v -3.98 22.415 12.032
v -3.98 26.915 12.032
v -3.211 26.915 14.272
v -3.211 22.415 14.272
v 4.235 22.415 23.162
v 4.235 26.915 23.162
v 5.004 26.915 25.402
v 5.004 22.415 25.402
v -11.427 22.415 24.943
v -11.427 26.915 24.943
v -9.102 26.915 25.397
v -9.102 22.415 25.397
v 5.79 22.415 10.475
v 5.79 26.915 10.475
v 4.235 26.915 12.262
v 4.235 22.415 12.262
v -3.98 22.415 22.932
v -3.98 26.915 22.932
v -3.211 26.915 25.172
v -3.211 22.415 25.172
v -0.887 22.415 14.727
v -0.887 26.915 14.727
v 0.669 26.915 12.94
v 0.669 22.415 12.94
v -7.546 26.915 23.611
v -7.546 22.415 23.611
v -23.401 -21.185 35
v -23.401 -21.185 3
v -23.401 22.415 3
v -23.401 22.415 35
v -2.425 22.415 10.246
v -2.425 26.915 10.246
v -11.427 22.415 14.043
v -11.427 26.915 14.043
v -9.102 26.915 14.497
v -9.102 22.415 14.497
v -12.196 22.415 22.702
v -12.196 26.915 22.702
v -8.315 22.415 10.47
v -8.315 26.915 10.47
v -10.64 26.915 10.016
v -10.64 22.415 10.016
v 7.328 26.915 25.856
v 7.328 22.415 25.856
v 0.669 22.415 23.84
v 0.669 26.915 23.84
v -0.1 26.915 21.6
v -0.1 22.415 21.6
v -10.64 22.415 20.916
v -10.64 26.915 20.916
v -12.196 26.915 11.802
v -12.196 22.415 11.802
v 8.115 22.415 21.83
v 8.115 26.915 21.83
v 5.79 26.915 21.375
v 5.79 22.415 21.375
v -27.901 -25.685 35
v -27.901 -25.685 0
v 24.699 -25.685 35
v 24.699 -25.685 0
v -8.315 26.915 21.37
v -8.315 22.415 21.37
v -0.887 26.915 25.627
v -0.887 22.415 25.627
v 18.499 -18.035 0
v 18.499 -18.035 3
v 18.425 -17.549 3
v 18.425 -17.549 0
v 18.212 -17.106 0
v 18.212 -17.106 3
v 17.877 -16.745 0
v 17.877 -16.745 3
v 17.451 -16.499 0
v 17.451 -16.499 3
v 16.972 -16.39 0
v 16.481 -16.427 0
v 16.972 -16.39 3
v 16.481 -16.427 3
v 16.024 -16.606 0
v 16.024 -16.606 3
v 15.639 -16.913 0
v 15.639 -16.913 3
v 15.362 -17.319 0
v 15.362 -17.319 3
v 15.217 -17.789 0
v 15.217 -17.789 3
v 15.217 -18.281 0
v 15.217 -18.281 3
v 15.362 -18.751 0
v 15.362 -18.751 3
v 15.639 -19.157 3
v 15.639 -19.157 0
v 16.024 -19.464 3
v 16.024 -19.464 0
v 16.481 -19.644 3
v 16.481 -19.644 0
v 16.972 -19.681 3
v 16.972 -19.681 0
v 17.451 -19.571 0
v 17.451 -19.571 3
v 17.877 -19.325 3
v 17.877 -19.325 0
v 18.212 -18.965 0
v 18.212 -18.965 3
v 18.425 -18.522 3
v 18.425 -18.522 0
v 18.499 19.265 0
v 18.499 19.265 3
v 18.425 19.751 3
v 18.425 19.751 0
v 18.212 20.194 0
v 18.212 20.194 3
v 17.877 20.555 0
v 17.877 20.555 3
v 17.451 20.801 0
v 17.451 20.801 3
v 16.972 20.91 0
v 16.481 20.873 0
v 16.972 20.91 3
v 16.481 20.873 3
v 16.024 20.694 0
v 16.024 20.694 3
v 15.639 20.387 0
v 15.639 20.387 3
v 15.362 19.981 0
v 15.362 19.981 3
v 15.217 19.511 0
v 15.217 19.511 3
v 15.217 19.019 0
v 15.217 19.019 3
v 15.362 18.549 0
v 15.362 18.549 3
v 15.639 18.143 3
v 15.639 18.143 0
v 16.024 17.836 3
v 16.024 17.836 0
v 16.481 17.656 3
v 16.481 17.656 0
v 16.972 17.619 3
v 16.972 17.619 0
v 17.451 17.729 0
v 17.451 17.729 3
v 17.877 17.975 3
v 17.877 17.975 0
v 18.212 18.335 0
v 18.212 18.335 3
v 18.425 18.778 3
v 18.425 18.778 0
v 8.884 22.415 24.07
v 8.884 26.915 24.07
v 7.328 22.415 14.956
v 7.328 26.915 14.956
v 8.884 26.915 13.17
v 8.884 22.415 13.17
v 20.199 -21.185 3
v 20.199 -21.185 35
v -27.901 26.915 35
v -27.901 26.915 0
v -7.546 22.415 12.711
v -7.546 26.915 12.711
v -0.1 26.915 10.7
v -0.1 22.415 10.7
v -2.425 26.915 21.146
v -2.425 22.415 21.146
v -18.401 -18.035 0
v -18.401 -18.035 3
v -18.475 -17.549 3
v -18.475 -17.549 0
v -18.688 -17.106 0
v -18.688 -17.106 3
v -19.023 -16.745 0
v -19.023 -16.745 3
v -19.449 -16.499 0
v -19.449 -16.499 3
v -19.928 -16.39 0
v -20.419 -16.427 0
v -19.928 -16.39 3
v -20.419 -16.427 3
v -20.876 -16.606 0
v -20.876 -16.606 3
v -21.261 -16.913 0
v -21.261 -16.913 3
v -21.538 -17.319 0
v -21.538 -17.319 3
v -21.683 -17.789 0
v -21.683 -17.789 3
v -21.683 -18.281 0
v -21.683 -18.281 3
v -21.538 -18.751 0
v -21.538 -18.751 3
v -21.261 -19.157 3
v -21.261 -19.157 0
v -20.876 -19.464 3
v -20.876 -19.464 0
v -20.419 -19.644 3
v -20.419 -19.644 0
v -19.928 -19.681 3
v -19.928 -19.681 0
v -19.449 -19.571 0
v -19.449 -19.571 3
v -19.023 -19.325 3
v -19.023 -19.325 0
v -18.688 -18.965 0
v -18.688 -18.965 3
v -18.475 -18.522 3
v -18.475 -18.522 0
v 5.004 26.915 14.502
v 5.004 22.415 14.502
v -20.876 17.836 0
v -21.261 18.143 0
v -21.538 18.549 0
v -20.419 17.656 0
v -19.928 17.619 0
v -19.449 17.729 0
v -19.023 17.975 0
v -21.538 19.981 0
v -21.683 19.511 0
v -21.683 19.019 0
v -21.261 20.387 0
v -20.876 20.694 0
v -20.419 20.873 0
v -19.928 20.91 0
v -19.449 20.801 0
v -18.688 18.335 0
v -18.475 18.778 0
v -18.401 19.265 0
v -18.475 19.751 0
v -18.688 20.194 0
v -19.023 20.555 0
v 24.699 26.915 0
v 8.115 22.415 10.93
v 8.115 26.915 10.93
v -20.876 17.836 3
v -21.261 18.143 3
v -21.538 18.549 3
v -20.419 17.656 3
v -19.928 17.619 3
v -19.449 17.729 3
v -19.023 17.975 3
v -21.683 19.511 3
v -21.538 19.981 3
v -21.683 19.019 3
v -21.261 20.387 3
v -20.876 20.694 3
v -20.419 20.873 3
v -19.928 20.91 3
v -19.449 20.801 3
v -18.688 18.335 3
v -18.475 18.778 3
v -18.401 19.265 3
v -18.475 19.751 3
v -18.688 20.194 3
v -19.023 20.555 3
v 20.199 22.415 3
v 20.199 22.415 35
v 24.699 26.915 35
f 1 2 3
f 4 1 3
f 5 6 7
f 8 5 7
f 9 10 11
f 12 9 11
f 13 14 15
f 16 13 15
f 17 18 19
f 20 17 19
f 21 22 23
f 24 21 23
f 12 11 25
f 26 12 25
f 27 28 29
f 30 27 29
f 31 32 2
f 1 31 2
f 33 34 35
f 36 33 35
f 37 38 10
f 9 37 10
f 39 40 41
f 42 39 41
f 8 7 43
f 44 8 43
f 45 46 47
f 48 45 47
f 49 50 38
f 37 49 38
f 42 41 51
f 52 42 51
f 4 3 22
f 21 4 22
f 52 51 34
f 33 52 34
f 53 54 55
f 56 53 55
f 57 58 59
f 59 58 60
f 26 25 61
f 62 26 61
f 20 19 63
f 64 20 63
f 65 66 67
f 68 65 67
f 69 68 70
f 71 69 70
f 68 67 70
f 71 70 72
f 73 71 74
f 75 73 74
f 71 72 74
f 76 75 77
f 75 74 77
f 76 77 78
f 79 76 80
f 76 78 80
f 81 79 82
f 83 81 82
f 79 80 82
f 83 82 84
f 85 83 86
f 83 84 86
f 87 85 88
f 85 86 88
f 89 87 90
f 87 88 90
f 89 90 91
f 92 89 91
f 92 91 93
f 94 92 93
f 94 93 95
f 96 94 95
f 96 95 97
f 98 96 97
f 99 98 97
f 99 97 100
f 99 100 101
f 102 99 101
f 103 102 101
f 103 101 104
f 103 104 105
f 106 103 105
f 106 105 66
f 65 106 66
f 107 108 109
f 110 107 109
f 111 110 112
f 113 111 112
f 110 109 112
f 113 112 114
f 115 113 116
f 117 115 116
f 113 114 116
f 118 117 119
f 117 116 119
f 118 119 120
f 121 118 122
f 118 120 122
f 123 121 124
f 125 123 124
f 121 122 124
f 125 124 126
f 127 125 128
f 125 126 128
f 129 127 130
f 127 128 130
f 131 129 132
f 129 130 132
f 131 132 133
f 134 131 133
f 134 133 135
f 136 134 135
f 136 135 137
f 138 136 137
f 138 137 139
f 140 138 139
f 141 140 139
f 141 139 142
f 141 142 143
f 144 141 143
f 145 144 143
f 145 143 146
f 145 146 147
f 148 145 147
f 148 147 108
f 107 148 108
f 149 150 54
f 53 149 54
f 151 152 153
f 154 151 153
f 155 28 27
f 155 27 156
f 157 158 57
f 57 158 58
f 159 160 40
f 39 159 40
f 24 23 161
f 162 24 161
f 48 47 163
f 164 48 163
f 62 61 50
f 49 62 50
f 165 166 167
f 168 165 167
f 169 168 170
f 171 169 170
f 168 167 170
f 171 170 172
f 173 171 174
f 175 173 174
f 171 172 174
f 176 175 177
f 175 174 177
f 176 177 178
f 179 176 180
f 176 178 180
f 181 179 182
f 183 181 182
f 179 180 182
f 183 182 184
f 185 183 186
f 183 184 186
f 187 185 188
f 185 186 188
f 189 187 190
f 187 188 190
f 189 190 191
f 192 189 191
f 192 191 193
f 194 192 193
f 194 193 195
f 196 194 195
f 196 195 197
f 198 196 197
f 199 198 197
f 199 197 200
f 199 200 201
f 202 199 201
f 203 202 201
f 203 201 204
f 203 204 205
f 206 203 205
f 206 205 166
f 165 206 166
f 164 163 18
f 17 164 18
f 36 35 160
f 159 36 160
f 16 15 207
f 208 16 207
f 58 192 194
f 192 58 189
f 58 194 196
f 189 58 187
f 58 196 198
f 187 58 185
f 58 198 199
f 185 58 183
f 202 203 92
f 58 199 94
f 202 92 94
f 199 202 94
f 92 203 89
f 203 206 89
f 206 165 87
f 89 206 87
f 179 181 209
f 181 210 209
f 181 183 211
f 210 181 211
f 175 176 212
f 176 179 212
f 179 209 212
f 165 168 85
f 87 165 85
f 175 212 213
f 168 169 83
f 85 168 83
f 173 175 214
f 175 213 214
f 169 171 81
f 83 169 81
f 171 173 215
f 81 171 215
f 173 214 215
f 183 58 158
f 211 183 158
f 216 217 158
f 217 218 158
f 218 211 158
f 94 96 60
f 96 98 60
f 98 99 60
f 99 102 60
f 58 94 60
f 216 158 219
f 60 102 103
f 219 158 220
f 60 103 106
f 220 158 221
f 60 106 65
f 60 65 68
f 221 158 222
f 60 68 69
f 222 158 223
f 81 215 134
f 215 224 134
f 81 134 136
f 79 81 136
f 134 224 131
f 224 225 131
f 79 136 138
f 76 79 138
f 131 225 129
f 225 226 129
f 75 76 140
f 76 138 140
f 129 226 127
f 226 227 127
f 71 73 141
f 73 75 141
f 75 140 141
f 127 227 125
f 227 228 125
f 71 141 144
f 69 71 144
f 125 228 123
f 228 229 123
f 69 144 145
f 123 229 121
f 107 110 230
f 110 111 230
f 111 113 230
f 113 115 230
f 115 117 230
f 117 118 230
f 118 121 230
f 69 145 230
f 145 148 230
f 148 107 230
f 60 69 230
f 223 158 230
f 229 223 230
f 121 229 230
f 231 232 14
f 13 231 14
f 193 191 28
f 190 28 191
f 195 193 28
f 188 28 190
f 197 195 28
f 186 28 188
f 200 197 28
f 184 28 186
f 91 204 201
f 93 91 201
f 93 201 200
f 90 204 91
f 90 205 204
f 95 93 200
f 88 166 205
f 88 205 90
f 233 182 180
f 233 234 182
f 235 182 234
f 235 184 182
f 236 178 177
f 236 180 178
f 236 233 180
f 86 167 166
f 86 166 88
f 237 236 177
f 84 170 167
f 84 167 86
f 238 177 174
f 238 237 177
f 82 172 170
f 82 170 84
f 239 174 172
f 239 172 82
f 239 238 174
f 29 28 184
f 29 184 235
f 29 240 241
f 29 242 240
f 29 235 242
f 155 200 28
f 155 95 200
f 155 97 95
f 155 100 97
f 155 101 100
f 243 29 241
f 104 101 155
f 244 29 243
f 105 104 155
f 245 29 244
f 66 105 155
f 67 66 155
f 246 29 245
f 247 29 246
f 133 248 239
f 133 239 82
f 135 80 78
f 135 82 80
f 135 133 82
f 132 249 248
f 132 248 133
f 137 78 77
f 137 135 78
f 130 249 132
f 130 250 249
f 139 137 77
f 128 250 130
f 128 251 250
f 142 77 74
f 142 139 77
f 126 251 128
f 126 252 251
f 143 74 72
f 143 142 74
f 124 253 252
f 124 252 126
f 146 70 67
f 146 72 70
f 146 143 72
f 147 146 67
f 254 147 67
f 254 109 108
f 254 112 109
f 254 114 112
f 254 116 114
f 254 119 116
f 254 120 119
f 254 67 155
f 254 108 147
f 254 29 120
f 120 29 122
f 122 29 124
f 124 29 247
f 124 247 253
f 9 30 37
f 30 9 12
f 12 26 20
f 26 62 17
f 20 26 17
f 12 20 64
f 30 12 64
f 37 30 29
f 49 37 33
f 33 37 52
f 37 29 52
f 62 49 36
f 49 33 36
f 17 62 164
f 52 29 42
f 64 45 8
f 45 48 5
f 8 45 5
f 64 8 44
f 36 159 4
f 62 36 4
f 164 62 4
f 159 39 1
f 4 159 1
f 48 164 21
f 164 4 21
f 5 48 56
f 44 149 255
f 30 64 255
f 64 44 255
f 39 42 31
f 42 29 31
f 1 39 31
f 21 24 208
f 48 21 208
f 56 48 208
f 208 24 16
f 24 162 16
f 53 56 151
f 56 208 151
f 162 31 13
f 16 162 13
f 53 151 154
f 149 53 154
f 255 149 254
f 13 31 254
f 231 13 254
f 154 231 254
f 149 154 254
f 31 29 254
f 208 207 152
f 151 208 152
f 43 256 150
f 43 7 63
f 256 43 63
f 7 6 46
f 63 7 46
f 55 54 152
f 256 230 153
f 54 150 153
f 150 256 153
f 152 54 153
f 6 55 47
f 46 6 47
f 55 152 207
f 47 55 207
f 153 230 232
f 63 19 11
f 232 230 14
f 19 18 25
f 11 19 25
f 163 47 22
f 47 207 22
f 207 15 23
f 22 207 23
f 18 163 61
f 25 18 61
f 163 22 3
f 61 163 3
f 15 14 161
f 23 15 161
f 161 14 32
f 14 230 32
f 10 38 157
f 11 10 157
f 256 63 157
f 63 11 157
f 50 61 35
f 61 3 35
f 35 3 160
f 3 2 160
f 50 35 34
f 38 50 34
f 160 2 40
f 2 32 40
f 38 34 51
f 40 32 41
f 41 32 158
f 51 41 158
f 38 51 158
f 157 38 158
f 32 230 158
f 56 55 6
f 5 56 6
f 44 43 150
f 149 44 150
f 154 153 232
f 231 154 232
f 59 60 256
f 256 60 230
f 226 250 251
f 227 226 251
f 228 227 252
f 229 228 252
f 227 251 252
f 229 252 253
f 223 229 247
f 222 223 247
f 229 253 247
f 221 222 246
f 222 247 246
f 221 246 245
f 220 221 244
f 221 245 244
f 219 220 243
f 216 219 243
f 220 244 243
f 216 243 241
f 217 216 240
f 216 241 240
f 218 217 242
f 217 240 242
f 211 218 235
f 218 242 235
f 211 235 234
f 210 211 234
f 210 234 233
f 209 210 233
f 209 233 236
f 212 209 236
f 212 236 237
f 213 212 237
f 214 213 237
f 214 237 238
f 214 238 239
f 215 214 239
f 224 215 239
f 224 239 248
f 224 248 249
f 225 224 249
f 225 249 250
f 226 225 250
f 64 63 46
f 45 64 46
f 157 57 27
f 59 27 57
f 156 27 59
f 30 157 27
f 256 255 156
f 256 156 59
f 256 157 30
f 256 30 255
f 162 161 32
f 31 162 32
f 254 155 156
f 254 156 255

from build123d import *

# Parameters (mm, degrees)
F0_W     = 43.6
F0_H     = 43.6
F2_DEPTH = 3
F3_R     = 1.65
F4_DEPTH = 25
F1_W     = 43.6
F1_H     = 43.6
F5_DEPTH = 35
F7_DEPTH = 25


with BuildPart() as f2:
    # F0 (on Top) → F2 (new body)
    with BuildSketch(Plane.XY):
        with Locations((-1.601375, 0.614843)):
            Rectangle(F0_W, F0_H)
    extrude(amount=F2_DEPTH)

    # F3 (on face) → F4 (cut)
    with BuildSketch(Plane.XY.offset(3)):
        with Locations((-20.051375, 19.264843)):
            Circle(F3_R)
        with Locations((16.848625, 19.264843)):
            Circle(F3_R)
        with Locations((16.848625, -18.035157)):
            Circle(F3_R)
        with Locations((-20.051375, -18.035157)):
            Circle(F3_R)
    extrude(amount=-F4_DEPTH, mode=Mode.SUBTRACT)

    # F1 (on Top) → F5 (join)
    with BuildSketch(Plane.XY):
        Polygon((20.198625, 26.914843), (-23.401375, 26.914843), (-27.901375, 26.914843), (-27.901375, 22.414843), (-27.901375, -21.185157), (-27.901375, -25.685157), (-23.401375, -25.685157), (20.198625, -25.685157), (24.698625, -25.685157), (24.698625, -21.185157), (24.698625, 22.414843), (24.698625, 26.914843), align=None)
        with Locations((-1.601375, 0.614843)):
            Rectangle(F1_W, F1_H, mode=Mode.SUBTRACT)
    extrude(amount=F5_DEPTH)

    # F6 (on face) → F7 (cut)
    with BuildSketch(Plane(origin=(0, 26.914843, 0), x_dir=(-1, 0, 0), z_dir=(0, 1, 0))):
        Polygon((-5.790295, 21.375465), (-4.23457, 23.161669), (-5.003605, 25.402069), (-7.328367, 25.856265), (-8.884092, 24.070061), (-8.115056, 21.829661), align=None)
        Polygon((-8.115056, 10.929661), (-5.790295, 10.475465), (-4.23457, 12.261669), (-5.003605, 14.502069), (-7.328367, 14.956265), (-8.884092, 13.170061), align=None)
        Polygon((0.1, 21.6), (2.424761, 21.145804), (3.980487, 22.932009), (3.211451, 25.172409), (0.88669, 25.626604), (-0.669036, 23.8404), align=None)
        Polygon((0.1, 10.7), (2.424761, 10.245804), (3.980487, 12.032009), (3.211451, 14.272409), (0.88669, 14.726604), (-0.669036, 12.9404), align=None)
        Polygon((8.315056, 21.370339), (10.639818, 20.916144), (12.195543, 22.702348), (11.426507, 24.942748), (9.101746, 25.396944), (7.546021, 23.610739), align=None)
        Polygon((8.315056, 10.470339), (10.639818, 10.016144), (12.195543, 11.802348), (11.426507, 14.042748), (9.101746, 14.496944), (7.546021, 12.710739), align=None)
    extrude(amount=-F7_DEPTH, mode=Mode.SUBTRACT)


solid = f2.part
